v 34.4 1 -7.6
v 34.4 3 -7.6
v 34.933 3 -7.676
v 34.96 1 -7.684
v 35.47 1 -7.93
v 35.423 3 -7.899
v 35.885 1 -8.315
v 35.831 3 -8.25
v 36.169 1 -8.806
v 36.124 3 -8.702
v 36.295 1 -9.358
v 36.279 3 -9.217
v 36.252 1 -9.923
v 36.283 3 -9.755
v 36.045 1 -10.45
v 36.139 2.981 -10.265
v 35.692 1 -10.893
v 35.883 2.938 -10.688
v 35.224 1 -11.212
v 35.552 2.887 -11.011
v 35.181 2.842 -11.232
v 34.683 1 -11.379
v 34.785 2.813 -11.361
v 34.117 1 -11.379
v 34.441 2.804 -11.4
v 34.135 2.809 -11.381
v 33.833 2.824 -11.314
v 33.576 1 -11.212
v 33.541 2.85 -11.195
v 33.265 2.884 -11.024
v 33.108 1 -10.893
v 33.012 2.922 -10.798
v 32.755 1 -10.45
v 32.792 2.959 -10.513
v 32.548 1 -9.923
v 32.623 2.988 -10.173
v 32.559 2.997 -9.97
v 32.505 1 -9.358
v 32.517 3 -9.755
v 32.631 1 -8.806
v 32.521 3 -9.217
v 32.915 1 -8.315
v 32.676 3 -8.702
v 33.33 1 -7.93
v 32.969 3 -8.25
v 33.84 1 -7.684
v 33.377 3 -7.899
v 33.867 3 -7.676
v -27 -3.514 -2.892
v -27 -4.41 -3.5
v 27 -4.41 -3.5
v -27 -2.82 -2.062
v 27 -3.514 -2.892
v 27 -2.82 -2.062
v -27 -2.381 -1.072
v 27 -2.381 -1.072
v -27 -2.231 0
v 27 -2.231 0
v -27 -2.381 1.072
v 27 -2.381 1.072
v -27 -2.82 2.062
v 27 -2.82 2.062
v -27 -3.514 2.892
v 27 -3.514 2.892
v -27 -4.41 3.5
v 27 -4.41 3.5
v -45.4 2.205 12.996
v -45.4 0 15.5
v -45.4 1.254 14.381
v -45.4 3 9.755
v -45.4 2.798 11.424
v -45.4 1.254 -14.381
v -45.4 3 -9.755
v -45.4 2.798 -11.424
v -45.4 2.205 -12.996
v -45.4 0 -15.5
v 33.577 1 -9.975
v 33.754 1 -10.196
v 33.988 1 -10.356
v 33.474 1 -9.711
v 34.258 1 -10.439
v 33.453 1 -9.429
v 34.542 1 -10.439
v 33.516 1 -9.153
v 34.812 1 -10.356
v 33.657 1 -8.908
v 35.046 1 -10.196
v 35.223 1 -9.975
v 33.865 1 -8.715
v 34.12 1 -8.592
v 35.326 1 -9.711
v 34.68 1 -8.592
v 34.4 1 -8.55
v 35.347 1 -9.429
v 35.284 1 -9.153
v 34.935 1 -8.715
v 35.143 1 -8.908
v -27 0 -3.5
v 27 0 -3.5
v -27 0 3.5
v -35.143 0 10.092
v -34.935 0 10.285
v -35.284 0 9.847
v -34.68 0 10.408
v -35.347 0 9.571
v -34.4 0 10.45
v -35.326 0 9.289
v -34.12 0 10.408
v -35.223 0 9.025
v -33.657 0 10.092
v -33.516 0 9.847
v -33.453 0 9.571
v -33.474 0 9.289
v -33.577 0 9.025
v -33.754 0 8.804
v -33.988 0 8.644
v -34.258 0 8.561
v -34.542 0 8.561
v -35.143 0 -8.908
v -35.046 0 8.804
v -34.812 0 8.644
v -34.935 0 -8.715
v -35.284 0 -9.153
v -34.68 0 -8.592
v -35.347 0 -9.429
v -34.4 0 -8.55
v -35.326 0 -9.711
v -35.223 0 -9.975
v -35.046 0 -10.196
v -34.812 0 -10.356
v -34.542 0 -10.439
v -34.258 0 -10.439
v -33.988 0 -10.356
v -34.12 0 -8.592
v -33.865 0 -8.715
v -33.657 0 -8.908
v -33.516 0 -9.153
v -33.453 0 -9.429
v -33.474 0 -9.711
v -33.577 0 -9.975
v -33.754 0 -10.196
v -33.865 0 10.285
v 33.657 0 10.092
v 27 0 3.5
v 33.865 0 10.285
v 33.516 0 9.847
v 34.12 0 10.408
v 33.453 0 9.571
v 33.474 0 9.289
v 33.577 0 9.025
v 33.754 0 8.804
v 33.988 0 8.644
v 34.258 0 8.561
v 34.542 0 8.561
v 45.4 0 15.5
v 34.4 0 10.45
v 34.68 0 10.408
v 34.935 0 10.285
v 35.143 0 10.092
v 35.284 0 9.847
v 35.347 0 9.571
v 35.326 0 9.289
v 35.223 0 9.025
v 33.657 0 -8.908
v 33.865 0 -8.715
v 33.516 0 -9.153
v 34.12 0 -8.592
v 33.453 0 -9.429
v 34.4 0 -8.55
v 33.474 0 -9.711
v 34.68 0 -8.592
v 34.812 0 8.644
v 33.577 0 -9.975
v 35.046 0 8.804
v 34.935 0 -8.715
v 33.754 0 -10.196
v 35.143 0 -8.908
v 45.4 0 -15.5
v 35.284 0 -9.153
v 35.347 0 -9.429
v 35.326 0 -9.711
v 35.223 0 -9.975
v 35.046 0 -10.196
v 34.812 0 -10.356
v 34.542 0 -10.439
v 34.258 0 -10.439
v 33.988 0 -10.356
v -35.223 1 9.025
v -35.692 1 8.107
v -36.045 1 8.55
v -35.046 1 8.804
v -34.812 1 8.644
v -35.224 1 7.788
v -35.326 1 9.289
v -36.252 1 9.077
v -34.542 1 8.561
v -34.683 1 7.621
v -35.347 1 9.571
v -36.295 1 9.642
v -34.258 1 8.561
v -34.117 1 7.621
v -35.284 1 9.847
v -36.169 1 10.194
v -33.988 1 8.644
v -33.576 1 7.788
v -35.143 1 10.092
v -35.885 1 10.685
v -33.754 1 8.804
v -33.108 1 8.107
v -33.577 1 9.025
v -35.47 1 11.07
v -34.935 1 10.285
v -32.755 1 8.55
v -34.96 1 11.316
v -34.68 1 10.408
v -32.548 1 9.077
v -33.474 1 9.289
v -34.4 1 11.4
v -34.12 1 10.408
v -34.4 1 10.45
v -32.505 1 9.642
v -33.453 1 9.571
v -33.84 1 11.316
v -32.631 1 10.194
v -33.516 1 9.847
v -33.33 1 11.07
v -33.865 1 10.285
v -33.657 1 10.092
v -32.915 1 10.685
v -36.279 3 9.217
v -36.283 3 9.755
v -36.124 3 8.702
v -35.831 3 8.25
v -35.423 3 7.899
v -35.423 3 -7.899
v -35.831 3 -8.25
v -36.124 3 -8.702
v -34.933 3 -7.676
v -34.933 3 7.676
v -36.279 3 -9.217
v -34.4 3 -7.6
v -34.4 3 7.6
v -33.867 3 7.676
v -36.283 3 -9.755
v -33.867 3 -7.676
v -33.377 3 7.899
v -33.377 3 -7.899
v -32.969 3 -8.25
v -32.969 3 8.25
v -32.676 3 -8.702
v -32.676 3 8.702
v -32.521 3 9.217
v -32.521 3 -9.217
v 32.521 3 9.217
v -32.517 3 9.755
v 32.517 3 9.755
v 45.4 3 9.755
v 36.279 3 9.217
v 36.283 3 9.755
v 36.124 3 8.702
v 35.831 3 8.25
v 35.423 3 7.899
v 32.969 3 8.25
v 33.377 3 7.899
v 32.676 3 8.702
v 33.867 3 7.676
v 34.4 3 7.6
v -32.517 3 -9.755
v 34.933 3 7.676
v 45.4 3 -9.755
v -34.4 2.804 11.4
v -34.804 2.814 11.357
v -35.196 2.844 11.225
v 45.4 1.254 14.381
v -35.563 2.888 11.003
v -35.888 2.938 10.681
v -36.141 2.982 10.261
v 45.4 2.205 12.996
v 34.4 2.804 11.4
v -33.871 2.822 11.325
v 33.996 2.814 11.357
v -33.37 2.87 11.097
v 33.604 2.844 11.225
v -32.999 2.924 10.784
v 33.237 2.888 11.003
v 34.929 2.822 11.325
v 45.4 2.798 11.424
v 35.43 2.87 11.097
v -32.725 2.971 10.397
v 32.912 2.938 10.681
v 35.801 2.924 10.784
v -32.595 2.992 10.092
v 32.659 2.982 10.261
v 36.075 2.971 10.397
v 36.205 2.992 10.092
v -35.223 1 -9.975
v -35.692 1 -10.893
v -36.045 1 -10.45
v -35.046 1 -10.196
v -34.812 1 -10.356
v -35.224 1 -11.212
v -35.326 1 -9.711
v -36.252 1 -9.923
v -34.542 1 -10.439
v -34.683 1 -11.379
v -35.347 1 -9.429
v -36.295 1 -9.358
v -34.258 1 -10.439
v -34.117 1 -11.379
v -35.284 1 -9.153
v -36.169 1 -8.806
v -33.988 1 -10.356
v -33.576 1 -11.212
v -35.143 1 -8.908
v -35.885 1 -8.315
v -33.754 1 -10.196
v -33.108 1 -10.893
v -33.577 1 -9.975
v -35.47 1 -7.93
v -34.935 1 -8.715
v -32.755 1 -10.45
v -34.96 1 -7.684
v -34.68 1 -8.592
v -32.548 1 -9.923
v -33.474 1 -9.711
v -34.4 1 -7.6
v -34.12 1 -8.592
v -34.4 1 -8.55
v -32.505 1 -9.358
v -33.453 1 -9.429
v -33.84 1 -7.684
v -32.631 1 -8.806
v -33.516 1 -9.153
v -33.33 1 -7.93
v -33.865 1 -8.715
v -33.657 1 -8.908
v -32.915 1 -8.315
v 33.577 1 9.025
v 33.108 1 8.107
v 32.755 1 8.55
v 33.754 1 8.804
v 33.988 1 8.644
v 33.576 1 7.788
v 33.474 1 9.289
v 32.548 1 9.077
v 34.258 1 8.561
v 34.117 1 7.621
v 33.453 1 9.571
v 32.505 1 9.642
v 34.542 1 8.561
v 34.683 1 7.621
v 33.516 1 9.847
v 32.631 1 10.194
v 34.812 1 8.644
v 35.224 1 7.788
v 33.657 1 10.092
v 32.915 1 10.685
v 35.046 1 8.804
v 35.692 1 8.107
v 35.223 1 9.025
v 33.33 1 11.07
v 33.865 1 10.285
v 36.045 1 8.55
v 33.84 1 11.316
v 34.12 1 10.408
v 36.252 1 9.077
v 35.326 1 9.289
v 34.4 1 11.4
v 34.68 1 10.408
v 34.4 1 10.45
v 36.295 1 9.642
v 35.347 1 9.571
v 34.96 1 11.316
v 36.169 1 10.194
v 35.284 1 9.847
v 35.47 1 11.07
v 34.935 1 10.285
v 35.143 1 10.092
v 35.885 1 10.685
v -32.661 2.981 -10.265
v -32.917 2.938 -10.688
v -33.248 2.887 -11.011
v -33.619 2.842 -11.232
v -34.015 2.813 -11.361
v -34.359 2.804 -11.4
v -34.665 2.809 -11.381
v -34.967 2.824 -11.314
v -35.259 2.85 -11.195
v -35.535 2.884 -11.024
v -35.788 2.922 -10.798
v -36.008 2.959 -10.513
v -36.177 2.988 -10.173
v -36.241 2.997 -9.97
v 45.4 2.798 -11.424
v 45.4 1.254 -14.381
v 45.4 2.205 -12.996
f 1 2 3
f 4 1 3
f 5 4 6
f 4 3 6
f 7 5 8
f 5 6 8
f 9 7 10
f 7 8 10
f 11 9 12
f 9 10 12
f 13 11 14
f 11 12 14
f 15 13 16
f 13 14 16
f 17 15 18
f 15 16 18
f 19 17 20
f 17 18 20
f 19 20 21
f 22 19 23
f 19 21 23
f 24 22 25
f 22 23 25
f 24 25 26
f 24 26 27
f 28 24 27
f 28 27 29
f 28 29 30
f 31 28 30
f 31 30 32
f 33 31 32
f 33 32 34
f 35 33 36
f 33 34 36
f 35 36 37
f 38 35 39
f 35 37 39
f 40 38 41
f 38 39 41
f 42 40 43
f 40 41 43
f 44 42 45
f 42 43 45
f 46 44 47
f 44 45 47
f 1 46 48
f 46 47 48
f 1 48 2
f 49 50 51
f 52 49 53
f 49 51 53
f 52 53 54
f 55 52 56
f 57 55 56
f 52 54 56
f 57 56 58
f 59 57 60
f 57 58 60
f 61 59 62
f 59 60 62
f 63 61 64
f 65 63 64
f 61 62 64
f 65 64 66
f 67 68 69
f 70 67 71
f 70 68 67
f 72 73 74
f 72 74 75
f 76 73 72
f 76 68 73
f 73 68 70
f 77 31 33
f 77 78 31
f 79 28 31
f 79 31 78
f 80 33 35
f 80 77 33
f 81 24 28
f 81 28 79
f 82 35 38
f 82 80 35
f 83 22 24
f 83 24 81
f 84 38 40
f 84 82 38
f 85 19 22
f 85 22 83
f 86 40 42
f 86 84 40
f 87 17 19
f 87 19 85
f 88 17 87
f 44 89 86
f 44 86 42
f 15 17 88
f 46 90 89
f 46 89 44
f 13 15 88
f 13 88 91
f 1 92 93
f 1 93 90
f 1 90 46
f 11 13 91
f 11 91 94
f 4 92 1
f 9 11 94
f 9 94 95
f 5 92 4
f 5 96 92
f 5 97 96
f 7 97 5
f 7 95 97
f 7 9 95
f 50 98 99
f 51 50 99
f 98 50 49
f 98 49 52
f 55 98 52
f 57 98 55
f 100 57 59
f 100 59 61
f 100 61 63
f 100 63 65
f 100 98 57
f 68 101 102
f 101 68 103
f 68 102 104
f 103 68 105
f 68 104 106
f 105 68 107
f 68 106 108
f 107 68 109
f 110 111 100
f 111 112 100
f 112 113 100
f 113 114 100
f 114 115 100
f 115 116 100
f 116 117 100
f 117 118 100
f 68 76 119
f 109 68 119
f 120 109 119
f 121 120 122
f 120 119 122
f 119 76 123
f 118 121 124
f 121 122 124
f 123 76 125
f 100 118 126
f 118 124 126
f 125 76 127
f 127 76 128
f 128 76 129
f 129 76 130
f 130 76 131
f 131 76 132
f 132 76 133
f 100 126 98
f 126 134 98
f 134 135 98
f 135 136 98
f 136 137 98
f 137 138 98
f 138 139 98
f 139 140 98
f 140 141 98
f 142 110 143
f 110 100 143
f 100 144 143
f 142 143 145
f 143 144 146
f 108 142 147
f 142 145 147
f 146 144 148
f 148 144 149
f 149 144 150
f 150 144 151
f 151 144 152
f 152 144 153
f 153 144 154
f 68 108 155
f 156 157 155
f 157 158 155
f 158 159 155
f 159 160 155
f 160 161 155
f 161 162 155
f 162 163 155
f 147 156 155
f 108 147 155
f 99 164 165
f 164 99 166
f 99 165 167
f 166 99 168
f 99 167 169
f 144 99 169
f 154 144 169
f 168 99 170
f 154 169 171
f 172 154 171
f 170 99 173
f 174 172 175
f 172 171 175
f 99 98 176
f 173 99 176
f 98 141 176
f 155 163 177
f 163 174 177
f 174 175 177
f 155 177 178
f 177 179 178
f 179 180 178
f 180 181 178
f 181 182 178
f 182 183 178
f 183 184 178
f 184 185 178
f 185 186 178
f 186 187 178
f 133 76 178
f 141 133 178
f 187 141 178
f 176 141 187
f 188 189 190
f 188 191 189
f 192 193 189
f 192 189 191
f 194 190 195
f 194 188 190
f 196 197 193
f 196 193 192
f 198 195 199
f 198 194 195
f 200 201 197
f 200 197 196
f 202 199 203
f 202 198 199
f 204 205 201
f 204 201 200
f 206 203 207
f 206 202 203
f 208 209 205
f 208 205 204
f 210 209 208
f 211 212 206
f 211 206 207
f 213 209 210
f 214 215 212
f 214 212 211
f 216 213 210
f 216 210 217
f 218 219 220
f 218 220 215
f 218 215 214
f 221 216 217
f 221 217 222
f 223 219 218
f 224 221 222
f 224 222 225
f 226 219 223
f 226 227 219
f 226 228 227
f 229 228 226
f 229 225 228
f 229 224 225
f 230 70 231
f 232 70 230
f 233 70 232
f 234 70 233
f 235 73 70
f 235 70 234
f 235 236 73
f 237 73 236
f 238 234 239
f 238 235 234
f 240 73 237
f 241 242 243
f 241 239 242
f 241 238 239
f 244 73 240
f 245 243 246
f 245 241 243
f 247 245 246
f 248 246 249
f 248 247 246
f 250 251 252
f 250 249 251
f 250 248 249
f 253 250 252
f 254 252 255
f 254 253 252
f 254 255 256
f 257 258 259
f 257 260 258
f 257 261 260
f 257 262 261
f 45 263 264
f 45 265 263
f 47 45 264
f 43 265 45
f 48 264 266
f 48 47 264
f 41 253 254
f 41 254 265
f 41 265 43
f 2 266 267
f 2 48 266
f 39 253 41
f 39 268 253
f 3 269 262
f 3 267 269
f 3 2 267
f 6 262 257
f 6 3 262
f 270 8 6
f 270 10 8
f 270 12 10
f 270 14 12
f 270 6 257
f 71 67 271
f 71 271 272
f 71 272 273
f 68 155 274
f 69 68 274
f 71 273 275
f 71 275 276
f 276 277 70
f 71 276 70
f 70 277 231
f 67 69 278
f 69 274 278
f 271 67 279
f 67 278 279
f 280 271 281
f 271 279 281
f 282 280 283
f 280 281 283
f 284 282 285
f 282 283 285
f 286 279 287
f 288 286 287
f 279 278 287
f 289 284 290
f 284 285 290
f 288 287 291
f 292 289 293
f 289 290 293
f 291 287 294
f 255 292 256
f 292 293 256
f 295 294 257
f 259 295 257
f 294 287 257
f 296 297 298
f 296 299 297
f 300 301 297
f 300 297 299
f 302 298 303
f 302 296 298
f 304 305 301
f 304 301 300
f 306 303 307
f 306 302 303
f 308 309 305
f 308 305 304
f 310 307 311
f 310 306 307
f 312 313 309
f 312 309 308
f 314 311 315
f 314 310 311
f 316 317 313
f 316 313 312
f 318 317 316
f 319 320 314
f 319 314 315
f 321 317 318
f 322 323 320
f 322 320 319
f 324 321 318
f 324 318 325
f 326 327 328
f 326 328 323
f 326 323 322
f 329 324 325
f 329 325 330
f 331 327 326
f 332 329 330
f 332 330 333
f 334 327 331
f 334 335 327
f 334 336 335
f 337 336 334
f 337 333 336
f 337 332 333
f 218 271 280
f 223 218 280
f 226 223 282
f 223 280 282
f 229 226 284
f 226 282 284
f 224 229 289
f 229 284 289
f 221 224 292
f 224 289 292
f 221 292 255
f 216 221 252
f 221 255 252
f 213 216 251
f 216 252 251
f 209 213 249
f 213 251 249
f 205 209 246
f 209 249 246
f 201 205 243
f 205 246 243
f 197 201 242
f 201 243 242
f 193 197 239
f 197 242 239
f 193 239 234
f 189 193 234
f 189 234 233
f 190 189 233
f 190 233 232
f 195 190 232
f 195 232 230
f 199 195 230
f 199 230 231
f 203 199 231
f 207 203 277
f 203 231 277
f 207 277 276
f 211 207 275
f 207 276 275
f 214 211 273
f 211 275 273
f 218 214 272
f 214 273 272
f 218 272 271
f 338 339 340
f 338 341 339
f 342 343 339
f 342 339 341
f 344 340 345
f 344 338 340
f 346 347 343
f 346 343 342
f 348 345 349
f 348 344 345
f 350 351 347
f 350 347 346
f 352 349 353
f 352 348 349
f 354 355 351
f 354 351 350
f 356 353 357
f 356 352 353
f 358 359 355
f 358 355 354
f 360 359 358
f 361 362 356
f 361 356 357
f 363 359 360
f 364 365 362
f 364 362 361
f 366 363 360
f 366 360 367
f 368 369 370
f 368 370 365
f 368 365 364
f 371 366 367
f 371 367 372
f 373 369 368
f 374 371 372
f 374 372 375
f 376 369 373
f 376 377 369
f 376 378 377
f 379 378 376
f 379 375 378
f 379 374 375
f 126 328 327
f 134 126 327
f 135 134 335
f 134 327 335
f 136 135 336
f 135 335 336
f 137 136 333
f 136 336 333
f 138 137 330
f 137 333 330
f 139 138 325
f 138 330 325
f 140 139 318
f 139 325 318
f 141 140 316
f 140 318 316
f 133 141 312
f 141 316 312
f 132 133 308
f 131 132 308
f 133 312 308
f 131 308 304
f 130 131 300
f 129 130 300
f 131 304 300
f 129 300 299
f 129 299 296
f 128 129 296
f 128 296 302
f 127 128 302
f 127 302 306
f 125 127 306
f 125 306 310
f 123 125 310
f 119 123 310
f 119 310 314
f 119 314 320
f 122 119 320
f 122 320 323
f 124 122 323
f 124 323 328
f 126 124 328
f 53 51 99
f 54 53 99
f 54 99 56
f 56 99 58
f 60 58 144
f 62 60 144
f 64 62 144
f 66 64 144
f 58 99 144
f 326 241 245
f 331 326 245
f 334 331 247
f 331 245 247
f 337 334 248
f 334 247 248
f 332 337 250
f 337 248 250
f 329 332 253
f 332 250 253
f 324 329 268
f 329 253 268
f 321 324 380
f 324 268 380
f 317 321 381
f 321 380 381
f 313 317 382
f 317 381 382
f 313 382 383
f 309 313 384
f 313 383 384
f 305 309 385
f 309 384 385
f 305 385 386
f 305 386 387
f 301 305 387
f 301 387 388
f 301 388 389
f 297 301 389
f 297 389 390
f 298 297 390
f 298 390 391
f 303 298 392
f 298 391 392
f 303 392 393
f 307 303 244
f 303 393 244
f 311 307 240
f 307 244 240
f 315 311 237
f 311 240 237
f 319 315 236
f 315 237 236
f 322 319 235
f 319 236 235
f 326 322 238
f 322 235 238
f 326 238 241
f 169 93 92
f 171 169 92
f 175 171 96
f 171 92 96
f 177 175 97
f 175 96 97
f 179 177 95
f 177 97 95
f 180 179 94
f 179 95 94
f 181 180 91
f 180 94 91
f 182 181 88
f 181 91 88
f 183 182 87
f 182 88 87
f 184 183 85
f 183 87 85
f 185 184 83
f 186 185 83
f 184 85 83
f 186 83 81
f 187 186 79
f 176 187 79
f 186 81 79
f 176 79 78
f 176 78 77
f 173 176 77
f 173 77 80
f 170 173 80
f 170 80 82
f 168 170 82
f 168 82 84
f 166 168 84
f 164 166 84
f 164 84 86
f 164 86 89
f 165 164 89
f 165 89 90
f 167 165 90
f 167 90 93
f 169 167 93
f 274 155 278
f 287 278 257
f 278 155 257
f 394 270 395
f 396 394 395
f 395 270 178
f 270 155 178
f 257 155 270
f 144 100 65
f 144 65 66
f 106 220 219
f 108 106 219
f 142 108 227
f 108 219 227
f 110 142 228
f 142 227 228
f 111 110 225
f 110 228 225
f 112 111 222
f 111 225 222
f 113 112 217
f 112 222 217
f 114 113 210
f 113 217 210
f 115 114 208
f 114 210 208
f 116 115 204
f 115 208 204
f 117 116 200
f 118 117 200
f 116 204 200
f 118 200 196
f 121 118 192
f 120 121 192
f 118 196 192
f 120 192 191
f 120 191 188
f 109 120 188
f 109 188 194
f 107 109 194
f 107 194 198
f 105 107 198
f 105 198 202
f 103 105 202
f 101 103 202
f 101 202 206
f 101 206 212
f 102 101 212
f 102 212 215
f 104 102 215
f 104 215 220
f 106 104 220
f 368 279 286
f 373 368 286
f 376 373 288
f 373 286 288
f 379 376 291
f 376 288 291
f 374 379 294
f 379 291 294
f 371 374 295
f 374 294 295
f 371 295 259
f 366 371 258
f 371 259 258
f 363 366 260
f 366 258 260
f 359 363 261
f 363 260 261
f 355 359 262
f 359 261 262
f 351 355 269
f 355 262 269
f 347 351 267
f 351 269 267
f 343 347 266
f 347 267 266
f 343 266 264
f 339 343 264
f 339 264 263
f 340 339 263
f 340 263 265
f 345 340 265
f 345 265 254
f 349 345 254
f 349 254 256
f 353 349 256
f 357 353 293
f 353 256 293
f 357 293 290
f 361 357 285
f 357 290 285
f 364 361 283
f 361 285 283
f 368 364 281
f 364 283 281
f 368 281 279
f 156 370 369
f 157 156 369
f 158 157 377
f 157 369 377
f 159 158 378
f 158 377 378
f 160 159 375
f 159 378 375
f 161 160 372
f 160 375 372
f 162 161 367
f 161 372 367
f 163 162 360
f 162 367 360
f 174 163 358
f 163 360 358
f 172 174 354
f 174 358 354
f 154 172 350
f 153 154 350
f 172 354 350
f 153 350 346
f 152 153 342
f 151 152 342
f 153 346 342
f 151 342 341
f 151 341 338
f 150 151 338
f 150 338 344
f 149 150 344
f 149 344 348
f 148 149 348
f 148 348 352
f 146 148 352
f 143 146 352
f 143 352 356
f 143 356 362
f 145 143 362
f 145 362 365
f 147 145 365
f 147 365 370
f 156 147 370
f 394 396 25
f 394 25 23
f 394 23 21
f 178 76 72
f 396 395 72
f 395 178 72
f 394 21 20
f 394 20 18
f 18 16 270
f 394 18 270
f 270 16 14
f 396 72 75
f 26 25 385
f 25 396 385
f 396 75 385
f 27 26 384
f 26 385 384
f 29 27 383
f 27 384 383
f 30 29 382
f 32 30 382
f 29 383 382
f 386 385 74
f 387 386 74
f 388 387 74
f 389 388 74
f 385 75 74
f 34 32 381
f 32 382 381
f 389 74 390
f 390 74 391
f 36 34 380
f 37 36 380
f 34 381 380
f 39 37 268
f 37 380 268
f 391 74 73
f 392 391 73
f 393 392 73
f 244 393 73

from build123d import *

# Parameters (mm, degrees)
SKETCH1_W           = 90.8
SKETCH1_H           = 31
BOSS_EXTRUDE1_DEPTH = 3
SKETCH2_R           = 0.95
CUT_EXTRUDE1_DEPTH  = 3
SKETCH3_R           = 1.9
CUT_EXTRUDE2_DEPTH  = 2
SKETCH4_W           = 54
SKETCH4_H           = 7
BOSS_EXTRUDE2_DEPTH = 5
SKETCH5_R           = 3.9
CUT_EXTRUDE3_DEPTH  = 54
FILLET1_R           = 7


with BuildPart() as part:
    # Sketch1 → Boss-Extrude1 (new body)
    with BuildSketch(Plane(origin=(0, 0, 0), x_dir=(1, 0, 0), z_dir=(0, 1, 0))):
        Rectangle(SKETCH1_W, SKETCH1_H)
    extrude(amount=BOSS_EXTRUDE1_DEPTH)

    # Sketch2 → Cut-Extrude1 (cut)
    with BuildSketch(Plane(origin=(0, 3, 0), x_dir=(1, 0, 0), z_dir=(0, 1, 0))):
        with Locations(Location((-34.4, 9.5, 0), (0, 0, 270))):
            Circle(SKETCH2_R)
        with Locations(Location((34.4, 9.5, 0), (0, 0, 270))):
            Circle(SKETCH2_R)
        with Locations(Location((-34.4, -9.5, 0), (0, 0, 270))):
            Circle(SKETCH2_R)
        with Locations(Location((34.4, -9.5, 0), (0, 0, 270))):
            Circle(SKETCH2_R)
    extrude(amount=-CUT_EXTRUDE1_DEPTH, mode=Mode.SUBTRACT)

    # Sketch3 → Cut-Extrude2 (cut)
    with BuildSketch(Plane(origin=(0, 3, 0), x_dir=(1, 0, 0), z_dir=(0, 1, 0))):
        with Locations(Location((-34.4, 9.5, 0), (0, 0, 270))):
            Circle(SKETCH3_R)
        with Locations(Location((-34.4, -9.5, 0), (0, 0, 270))):
            Circle(SKETCH3_R)
        with Locations(Location((34.4, 9.5, 0), (0, 0, 270))):
            Circle(SKETCH3_R)
        with Locations(Location((34.4, -9.5, 0), (0, 0, 270))):
            Circle(SKETCH3_R)
    extrude(amount=-CUT_EXTRUDE2_DEPTH, mode=Mode.SUBTRACT)

    # Sketch4 → Boss-Extrude2 (add)
    with BuildSketch(Plane.XZ):
        Rectangle(SKETCH4_W, SKETCH4_H)
    extrude(amount=BOSS_EXTRUDE2_DEPTH)

    # Sketch5 → Cut-Extrude3 (cut)
    with BuildSketch(Plane(origin=(27, 0, 0), x_dir=(0, 0, -1), z_dir=(1, 0, 0))):
        with Locations((0, -6.130658567)):
            Circle(SKETCH5_R)
    extrude(amount=-CUT_EXTRUDE3_DEPTH, mode=Mode.SUBTRACT)

    # Fillet1
    # the kernel refuses this fillet: 7 mm, written as the material it takes off along each edge
    with BuildSketch(Plane(origin=(59.761406616, 3, 15.5), x_dir=(0, 0, -1), z_dir=(-1, 0, 0))) as fillet1_piece_1:
        with BuildLine():
            CenterArc((5.744562647, 7), FILLET1_R, 214.849904579, 55.150095421)
            Line((0, 3), (-0.114891253, 2.92))
            ThreePointArc((-0.114891253, 2.92), (-0.14, 1.5), (-0.14, 0))
            Line((-0.14, 0), (0, -0.14))
            Line((0, -0.14), (5.744562647, -0.14))
            Line((5.744562647, -0.14), (5.744562647, 0))
        make_face()
    extrude(amount=119.522813233, mode=Mode.SUBTRACT)
    with BuildSketch(Plane(origin=(-59.761406616, 3, -15.5), x_dir=(0, -1, 0), z_dir=(1, 0, 0))) as fillet1_piece_2:
        with BuildLine():
            CenterArc((7, -5.744562647), FILLET1_R, 124.849904579, 55.150095421)
            Line((0, -5.744562647), (-0.14, -5.744562647))
            Line((-0.14, -5.744562647), (-0.14, 0))
            Line((-0.14, 0), (0, 0.14))
            ThreePointArc((0, 0.14), (1.5, 0.14), (2.92, 0.114891253))
            Line((2.92, 0.114891253), (3, 0))
        make_face()
    extrude(amount=119.522813233, mode=Mode.SUBTRACT)


solid = part.part
